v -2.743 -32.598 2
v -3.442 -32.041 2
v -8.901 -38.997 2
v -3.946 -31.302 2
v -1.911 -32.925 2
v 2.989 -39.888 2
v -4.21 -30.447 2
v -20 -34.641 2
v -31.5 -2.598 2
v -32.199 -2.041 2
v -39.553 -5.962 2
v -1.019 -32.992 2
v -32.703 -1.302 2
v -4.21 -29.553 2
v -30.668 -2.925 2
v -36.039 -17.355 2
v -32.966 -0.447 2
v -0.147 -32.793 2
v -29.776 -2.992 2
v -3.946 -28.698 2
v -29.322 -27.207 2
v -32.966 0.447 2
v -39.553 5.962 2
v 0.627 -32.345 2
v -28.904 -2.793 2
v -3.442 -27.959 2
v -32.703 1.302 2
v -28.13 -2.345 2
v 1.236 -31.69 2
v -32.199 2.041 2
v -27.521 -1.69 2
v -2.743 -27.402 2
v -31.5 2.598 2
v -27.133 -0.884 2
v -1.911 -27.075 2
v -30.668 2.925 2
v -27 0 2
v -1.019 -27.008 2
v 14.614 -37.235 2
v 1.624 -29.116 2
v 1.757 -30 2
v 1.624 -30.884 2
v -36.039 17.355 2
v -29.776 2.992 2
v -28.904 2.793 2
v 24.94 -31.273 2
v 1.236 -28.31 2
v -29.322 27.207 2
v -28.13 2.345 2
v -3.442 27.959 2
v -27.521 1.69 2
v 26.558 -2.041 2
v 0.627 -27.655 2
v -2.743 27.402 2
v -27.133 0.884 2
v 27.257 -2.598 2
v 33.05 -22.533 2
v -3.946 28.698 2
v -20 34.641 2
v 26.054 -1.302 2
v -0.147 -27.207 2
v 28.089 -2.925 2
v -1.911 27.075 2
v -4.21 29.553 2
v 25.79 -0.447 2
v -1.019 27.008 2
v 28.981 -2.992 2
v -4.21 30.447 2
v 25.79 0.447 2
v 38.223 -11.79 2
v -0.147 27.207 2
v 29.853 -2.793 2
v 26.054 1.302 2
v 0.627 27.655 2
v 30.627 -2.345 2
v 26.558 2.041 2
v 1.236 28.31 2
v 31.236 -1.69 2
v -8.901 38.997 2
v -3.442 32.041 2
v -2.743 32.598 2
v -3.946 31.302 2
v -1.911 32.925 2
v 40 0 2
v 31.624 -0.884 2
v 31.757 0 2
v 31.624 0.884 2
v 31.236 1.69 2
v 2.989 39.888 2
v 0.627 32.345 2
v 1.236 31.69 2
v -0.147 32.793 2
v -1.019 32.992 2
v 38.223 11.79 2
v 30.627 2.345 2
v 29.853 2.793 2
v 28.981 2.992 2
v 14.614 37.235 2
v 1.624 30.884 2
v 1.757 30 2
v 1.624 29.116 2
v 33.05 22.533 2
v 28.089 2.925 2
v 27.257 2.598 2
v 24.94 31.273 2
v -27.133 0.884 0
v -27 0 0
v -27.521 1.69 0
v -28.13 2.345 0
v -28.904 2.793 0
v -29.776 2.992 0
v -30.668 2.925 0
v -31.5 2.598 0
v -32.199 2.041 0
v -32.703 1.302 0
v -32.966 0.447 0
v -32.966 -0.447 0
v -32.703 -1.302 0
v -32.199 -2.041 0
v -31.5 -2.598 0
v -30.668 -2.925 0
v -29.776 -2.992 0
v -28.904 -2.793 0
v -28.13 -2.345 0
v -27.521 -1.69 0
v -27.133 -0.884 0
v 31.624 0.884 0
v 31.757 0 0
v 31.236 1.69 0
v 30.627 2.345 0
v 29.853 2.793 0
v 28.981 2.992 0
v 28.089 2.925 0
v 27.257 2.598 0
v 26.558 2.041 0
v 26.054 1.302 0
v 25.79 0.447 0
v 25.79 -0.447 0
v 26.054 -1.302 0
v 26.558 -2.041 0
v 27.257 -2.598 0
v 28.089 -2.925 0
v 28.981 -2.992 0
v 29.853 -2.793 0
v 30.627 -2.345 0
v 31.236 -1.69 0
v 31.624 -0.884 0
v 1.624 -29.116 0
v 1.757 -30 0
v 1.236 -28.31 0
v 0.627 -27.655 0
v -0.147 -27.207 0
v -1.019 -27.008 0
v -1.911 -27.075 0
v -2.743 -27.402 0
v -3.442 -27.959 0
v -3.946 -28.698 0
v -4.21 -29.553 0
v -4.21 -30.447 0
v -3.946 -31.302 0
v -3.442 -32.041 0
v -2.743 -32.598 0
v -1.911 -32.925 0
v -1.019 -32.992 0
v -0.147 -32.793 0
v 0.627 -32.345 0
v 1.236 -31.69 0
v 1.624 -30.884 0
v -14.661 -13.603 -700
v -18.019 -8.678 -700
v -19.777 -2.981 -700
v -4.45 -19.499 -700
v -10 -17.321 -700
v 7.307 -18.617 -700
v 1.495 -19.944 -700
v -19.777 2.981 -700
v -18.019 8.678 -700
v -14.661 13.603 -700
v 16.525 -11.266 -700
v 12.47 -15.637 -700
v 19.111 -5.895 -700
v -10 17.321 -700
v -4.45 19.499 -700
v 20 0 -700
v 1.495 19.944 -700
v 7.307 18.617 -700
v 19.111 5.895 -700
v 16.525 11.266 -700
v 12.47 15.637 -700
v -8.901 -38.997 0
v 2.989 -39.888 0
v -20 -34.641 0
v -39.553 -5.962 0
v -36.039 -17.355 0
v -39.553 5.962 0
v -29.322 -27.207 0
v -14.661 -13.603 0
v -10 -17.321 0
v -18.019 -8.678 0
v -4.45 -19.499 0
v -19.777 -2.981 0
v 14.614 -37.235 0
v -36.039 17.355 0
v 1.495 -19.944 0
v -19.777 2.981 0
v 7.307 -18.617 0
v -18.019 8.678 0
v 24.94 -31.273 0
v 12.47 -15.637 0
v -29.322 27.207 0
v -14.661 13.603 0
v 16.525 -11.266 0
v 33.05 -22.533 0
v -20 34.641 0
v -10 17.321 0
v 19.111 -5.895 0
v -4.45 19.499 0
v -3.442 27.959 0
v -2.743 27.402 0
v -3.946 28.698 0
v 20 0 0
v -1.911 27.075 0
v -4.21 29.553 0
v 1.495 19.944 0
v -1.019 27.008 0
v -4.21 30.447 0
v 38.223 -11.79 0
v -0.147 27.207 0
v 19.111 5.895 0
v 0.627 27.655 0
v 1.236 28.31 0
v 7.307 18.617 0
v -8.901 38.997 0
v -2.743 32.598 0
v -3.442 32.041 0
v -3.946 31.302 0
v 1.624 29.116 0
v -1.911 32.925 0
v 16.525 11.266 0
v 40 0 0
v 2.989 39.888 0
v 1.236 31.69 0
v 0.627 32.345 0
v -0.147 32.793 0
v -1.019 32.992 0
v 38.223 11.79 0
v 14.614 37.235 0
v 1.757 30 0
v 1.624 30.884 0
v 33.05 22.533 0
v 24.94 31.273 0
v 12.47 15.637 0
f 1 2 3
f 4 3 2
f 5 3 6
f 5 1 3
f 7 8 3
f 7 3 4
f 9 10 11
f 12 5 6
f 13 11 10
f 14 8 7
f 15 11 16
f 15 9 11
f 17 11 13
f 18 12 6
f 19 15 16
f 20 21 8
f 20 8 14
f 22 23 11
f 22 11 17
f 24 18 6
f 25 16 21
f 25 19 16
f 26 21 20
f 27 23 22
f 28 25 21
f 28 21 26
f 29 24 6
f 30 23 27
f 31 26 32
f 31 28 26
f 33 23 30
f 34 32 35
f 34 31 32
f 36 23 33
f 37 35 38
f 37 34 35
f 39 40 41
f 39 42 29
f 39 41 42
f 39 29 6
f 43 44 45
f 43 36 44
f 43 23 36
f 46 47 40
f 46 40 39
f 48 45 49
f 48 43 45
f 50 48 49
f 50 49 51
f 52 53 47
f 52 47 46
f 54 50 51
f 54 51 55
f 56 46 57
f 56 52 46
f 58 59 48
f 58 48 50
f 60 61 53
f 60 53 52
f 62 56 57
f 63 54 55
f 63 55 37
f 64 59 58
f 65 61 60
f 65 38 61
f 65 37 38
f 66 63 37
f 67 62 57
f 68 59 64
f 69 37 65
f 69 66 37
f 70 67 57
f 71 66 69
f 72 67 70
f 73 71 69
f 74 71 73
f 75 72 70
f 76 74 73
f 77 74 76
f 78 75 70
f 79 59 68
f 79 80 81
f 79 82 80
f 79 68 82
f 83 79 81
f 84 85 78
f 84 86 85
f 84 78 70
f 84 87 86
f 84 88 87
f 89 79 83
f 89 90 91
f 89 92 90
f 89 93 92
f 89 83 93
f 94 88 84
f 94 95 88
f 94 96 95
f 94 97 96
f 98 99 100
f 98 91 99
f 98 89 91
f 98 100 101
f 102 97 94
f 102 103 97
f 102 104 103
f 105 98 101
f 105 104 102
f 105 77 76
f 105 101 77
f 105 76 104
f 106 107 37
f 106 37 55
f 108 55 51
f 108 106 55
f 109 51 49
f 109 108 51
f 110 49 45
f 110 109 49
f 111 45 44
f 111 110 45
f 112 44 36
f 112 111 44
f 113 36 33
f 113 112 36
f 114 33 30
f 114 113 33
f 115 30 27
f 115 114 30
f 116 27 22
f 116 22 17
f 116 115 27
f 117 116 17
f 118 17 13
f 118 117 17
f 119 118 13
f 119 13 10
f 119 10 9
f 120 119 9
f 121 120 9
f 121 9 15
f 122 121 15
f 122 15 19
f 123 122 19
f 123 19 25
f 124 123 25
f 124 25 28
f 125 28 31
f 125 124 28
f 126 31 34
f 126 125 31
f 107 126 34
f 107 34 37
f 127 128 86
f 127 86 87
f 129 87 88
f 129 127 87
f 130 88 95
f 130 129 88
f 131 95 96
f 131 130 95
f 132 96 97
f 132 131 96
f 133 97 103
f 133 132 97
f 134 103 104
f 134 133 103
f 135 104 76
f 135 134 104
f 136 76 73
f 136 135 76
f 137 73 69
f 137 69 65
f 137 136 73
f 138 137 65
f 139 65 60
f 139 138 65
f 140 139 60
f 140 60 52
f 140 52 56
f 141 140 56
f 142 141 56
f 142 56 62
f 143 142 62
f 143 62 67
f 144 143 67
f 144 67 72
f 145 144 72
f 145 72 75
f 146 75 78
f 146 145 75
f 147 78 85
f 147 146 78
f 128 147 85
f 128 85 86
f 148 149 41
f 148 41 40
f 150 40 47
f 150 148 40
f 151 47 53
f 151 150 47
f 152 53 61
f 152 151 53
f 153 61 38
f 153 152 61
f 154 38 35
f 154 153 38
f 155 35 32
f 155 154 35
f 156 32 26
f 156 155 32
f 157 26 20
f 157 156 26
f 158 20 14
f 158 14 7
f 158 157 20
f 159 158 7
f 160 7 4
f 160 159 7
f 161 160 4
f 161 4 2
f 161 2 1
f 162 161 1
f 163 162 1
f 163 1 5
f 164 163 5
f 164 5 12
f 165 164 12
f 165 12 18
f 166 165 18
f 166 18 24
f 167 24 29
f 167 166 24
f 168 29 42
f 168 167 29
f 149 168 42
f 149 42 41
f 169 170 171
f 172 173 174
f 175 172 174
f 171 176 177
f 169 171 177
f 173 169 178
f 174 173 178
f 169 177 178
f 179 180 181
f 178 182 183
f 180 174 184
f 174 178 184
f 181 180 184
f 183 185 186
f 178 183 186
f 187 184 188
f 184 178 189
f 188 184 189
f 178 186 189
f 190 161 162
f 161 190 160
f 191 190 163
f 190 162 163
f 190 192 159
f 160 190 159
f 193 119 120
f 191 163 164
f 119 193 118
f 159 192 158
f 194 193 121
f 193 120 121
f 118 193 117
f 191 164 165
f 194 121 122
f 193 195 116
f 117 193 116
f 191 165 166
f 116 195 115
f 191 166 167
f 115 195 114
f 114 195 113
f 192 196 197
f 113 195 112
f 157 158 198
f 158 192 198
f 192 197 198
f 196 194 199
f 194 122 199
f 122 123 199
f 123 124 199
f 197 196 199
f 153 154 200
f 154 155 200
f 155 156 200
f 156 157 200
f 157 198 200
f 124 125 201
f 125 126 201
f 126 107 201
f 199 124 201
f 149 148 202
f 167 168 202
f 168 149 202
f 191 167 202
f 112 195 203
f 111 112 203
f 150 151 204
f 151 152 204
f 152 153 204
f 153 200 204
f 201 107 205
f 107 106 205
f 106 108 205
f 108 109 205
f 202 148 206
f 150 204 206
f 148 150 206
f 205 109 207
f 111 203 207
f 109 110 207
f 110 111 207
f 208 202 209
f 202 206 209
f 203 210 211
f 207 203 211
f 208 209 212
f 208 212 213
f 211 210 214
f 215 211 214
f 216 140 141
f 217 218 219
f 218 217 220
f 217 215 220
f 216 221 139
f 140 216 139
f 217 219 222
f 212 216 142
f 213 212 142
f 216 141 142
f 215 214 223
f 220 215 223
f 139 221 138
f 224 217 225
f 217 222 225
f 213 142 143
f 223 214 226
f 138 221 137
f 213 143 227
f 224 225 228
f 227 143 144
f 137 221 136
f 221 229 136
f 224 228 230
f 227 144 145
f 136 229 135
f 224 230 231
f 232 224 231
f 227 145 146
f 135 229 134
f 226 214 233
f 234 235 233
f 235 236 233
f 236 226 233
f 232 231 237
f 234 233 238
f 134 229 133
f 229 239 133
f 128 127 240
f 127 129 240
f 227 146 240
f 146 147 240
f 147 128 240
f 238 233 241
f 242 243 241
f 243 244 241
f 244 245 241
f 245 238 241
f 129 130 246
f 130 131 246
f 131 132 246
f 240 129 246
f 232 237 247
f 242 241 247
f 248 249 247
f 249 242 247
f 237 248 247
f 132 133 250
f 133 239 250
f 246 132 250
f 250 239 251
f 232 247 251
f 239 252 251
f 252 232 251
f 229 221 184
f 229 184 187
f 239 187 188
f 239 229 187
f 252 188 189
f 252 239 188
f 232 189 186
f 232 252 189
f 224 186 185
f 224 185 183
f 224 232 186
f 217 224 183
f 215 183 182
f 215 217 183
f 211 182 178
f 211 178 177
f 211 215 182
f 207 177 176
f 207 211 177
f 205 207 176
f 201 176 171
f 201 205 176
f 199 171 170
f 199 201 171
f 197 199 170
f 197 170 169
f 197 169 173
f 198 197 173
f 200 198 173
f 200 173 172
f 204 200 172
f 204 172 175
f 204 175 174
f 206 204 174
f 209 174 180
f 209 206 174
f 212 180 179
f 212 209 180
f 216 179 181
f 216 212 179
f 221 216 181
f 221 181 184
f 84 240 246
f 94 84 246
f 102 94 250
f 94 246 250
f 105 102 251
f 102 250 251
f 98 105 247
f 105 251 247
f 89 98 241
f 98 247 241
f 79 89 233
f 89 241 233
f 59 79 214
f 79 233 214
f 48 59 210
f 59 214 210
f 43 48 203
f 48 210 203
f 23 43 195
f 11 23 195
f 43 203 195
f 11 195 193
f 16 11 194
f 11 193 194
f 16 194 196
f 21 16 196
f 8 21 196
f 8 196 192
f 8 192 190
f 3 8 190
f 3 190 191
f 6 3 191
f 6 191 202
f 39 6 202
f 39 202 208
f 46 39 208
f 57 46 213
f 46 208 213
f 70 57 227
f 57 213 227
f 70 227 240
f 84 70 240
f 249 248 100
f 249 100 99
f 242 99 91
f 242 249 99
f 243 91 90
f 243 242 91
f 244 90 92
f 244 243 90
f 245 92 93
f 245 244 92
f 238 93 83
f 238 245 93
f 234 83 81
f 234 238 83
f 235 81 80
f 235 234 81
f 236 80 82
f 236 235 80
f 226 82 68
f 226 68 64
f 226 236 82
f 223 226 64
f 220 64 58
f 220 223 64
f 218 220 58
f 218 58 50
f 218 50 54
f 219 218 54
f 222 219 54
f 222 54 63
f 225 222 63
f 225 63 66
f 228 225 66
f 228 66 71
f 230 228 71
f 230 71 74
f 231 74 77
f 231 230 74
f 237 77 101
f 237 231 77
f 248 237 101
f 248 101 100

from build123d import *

# Parameters (mm, degrees)
F0_R     = 20
F1_DEPTH = 700
F2_R     = 40
F2_R_2   = 3
F3_DEPTH = 2


with BuildPart() as f1:
    # F0 (on Top) → F1 (new body)
    with BuildSketch(Plane.XY):
        Circle(F0_R)
    extrude(amount=-F1_DEPTH)

    # F2 (on Top) → F3 (join)
    with BuildSketch(Plane.XY):
        Circle(F2_R)
        with Locations((-1.2432069331, -30)):
            Circle(F2_R_2, mode=Mode.SUBTRACT)
        with Locations((-30, 0)):
            Circle(F2_R_2, mode=Mode.SUBTRACT)
        with Locations((-1.2432069331, 30)):
            Circle(F2_R_2, mode=Mode.SUBTRACT)
        with Locations((28.7567930669, 0)):
            Circle(F2_R_2, mode=Mode.SUBTRACT)
    extrude(amount=F3_DEPTH)


solid = f1.part
